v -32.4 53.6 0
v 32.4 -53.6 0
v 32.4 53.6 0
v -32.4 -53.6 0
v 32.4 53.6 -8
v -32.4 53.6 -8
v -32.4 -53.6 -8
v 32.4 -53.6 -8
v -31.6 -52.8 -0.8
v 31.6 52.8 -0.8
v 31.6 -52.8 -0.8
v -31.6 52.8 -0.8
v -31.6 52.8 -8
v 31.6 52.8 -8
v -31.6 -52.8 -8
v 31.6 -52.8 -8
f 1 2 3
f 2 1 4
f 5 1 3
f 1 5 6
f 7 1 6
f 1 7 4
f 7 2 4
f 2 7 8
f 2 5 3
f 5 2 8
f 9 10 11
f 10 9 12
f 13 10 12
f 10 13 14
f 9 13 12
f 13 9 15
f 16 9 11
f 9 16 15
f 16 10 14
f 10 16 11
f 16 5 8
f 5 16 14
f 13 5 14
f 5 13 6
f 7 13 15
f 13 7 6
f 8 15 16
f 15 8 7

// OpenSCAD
// file: ../p/box5.scad
use <../lib.scad>
function ldraw_lib__box5() = [
// 0 Box with 5 Faces and All Edges
// 0 Name: box5.dat
// 0 Author: James Jessiman
// 0 !LDRAW_ORG Primitive UPDATE 2012-01
// 0 !LICENSE Licensed under CC BY 4.0 : see CAreadme.txt
// 
// 0 BFC CERTIFY CCW
  [0,"BFC","CERTIFY"],
  [0,"BFC","CCW"],
// 
// 0 !HISTORY 2002-04-03 [sbliss] Modified for BFC compliance
// 0 !HISTORY 2002-04-25 [PTadmin] Official Update 2002-02
// 0 !HISTORY 2007-06-24 [PTadmin] Header formatted for Contributor Agreement
// 0 !HISTORY 2008-07-01 [PTadmin] Official Update 2008-01
// 0 !HISTORY 2012-02-16 [Philo] Changed to CCW
// 0 !HISTORY 2012-03-30 [PTadmin] Official Update 2012-01
// 
// 
// 2 24 1 1 1 -1 1 1
  [2,24,1,1,1,-1,1,1],
// 2 24 -1 1 1 -1 1 -1
  [2,24,-1,1,1,-1,1,-1],
// 2 24 -1 1 -1 1 1 -1
  [2,24,-1,1,-1,1,1,-1],
// 2 24 1 1 -1 1 1 1
  [2,24,1,1,-1,1,1,1],
// 2 24 1 0 1 -1 0 1
  [2,24,1,0,1,-1,0,1],
// 2 24 -1 0 1 -1 0 -1
  [2,24,-1,0,1,-1,0,-1],
// 2 24 -1 0 -1 1 0 -1
  [2,24,-1,0,-1,1,0,-1],
// 2 24 1 0 -1 1 0 1
  [2,24,1,0,-1,1,0,1],
// 2 24 1 0 1 1 1 1
  [2,24,1,0,1,1,1,1],
// 2 24 -1 0 1 -1 1 1
  [2,24,-1,0,1,-1,1,1],
// 2 24 1 0 -1 1 1 -1
  [2,24,1,0,-1,1,1,-1],
// 2 24 -1 0 -1 -1 1 -1
  [2,24,-1,0,-1,-1,1,-1],
// 4 16 -1 1 1 1 1 1 1 1 -1 -1 1 -1
  [4,16,-1,1,1,1,1,1,1,1,-1,-1,1,-1],
// 4 16 -1 1 1 -1 0 1 1 0 1 1 1 1
  [4,16,-1,1,1,-1,0,1,1,0,1,1,1,1],
// 4 16 -1 1 -1 -1 0 -1 -1 0 1 -1 1 1
  [4,16,-1,1,-1,-1,0,-1,-1,0,1,-1,1,1],
// 4 16 1 1 -1 1 0 -1 -1 0 -1 -1 1 -1
  [4,16,1,1,-1,1,0,-1,-1,0,-1,-1,1,-1],
// 4 16 1 1 1 1 0 1 1 0 -1 1 1 -1
  [4,16,1,1,1,1,0,1,1,0,-1,1,1,-1],
];
module ldraw_lib__box5(step=0, col=false, unit=2/5, alt=false, line=0.2, solid=!$preview)
    makepoly(ldraw_lib__box5(), step=step, col=col, unit=unit, alt=alt, line=line, solid=solid);
ldraw_lib__box5(line=0.2);
// main file
use <../lib.scad>
use <../p/box5.scad>
function ldraw_lib__88326() = [
// 0 ~Electric Power Functions Solar Panel Case Glass
// 0 Name: 88326.dat
// 0 Author: Philippe Hurbain [Philo]
// 0 !LDRAW_ORG Part UPDATE 2019-02
// 0 !LICENSE Licensed under CC BY 4.0 : see CAreadme.txt
// 
// 0 BFC CERTIFY CCW
  [0,"BFC","CERTIFY"],
  [0,"BFC","CCW"],
// 
// 0 !HISTORY 2019-09-09 [PTadmin] Official Update 2019-02
// 
// 
// 1 16 0 20 0 81 0 0 0 -20 0 0 0 134 box5.dat
  [1,16,0,20,0,81,0,0,0,-20,0,0,0,134, ldraw_lib__box5()],
// 0 BFC INVERTNEXT
  [0,"BFC","INVERTNEXT"],
// 1 16 0 20 0 79 0 0 0 -18 0 0 0 132 box5.dat
  [1,16,0,20,0,79,0,0,0,-18,0,0,0,132, ldraw_lib__box5()],
// 4 16 81 20 -134 79 20 -132 79 20 132 81 20 134
  [4,16,81,20,-134,79,20,-132,79,20,132,81,20,134],
// 4 16 -81 20 134 81 20 134 79 20 132 -79 20 132
  [4,16,-81,20,134,81,20,134,79,20,132,-79,20,132],
// 4 16 -81 20 -134 -81 20 134 -79 20 132 -79 20 -132
  [4,16,-81,20,-134,-81,20,134,-79,20,132,-79,20,-132],
// 4 16 -81 20 -134 -79 20 -132 79 20 -132 81 20 -134
  [4,16,-81,20,-134,-79,20,-132,79,20,-132,81,20,-134],
];
module ldraw_lib__88326(step=0, col=false, unit=2/5, alt=false, line=0.2, solid=!$preview)
    makepoly(ldraw_lib__88326(), step=step, col=col, unit=unit, alt=alt, line=line, solid=solid);
ldraw_lib__88326(line=0.2);
